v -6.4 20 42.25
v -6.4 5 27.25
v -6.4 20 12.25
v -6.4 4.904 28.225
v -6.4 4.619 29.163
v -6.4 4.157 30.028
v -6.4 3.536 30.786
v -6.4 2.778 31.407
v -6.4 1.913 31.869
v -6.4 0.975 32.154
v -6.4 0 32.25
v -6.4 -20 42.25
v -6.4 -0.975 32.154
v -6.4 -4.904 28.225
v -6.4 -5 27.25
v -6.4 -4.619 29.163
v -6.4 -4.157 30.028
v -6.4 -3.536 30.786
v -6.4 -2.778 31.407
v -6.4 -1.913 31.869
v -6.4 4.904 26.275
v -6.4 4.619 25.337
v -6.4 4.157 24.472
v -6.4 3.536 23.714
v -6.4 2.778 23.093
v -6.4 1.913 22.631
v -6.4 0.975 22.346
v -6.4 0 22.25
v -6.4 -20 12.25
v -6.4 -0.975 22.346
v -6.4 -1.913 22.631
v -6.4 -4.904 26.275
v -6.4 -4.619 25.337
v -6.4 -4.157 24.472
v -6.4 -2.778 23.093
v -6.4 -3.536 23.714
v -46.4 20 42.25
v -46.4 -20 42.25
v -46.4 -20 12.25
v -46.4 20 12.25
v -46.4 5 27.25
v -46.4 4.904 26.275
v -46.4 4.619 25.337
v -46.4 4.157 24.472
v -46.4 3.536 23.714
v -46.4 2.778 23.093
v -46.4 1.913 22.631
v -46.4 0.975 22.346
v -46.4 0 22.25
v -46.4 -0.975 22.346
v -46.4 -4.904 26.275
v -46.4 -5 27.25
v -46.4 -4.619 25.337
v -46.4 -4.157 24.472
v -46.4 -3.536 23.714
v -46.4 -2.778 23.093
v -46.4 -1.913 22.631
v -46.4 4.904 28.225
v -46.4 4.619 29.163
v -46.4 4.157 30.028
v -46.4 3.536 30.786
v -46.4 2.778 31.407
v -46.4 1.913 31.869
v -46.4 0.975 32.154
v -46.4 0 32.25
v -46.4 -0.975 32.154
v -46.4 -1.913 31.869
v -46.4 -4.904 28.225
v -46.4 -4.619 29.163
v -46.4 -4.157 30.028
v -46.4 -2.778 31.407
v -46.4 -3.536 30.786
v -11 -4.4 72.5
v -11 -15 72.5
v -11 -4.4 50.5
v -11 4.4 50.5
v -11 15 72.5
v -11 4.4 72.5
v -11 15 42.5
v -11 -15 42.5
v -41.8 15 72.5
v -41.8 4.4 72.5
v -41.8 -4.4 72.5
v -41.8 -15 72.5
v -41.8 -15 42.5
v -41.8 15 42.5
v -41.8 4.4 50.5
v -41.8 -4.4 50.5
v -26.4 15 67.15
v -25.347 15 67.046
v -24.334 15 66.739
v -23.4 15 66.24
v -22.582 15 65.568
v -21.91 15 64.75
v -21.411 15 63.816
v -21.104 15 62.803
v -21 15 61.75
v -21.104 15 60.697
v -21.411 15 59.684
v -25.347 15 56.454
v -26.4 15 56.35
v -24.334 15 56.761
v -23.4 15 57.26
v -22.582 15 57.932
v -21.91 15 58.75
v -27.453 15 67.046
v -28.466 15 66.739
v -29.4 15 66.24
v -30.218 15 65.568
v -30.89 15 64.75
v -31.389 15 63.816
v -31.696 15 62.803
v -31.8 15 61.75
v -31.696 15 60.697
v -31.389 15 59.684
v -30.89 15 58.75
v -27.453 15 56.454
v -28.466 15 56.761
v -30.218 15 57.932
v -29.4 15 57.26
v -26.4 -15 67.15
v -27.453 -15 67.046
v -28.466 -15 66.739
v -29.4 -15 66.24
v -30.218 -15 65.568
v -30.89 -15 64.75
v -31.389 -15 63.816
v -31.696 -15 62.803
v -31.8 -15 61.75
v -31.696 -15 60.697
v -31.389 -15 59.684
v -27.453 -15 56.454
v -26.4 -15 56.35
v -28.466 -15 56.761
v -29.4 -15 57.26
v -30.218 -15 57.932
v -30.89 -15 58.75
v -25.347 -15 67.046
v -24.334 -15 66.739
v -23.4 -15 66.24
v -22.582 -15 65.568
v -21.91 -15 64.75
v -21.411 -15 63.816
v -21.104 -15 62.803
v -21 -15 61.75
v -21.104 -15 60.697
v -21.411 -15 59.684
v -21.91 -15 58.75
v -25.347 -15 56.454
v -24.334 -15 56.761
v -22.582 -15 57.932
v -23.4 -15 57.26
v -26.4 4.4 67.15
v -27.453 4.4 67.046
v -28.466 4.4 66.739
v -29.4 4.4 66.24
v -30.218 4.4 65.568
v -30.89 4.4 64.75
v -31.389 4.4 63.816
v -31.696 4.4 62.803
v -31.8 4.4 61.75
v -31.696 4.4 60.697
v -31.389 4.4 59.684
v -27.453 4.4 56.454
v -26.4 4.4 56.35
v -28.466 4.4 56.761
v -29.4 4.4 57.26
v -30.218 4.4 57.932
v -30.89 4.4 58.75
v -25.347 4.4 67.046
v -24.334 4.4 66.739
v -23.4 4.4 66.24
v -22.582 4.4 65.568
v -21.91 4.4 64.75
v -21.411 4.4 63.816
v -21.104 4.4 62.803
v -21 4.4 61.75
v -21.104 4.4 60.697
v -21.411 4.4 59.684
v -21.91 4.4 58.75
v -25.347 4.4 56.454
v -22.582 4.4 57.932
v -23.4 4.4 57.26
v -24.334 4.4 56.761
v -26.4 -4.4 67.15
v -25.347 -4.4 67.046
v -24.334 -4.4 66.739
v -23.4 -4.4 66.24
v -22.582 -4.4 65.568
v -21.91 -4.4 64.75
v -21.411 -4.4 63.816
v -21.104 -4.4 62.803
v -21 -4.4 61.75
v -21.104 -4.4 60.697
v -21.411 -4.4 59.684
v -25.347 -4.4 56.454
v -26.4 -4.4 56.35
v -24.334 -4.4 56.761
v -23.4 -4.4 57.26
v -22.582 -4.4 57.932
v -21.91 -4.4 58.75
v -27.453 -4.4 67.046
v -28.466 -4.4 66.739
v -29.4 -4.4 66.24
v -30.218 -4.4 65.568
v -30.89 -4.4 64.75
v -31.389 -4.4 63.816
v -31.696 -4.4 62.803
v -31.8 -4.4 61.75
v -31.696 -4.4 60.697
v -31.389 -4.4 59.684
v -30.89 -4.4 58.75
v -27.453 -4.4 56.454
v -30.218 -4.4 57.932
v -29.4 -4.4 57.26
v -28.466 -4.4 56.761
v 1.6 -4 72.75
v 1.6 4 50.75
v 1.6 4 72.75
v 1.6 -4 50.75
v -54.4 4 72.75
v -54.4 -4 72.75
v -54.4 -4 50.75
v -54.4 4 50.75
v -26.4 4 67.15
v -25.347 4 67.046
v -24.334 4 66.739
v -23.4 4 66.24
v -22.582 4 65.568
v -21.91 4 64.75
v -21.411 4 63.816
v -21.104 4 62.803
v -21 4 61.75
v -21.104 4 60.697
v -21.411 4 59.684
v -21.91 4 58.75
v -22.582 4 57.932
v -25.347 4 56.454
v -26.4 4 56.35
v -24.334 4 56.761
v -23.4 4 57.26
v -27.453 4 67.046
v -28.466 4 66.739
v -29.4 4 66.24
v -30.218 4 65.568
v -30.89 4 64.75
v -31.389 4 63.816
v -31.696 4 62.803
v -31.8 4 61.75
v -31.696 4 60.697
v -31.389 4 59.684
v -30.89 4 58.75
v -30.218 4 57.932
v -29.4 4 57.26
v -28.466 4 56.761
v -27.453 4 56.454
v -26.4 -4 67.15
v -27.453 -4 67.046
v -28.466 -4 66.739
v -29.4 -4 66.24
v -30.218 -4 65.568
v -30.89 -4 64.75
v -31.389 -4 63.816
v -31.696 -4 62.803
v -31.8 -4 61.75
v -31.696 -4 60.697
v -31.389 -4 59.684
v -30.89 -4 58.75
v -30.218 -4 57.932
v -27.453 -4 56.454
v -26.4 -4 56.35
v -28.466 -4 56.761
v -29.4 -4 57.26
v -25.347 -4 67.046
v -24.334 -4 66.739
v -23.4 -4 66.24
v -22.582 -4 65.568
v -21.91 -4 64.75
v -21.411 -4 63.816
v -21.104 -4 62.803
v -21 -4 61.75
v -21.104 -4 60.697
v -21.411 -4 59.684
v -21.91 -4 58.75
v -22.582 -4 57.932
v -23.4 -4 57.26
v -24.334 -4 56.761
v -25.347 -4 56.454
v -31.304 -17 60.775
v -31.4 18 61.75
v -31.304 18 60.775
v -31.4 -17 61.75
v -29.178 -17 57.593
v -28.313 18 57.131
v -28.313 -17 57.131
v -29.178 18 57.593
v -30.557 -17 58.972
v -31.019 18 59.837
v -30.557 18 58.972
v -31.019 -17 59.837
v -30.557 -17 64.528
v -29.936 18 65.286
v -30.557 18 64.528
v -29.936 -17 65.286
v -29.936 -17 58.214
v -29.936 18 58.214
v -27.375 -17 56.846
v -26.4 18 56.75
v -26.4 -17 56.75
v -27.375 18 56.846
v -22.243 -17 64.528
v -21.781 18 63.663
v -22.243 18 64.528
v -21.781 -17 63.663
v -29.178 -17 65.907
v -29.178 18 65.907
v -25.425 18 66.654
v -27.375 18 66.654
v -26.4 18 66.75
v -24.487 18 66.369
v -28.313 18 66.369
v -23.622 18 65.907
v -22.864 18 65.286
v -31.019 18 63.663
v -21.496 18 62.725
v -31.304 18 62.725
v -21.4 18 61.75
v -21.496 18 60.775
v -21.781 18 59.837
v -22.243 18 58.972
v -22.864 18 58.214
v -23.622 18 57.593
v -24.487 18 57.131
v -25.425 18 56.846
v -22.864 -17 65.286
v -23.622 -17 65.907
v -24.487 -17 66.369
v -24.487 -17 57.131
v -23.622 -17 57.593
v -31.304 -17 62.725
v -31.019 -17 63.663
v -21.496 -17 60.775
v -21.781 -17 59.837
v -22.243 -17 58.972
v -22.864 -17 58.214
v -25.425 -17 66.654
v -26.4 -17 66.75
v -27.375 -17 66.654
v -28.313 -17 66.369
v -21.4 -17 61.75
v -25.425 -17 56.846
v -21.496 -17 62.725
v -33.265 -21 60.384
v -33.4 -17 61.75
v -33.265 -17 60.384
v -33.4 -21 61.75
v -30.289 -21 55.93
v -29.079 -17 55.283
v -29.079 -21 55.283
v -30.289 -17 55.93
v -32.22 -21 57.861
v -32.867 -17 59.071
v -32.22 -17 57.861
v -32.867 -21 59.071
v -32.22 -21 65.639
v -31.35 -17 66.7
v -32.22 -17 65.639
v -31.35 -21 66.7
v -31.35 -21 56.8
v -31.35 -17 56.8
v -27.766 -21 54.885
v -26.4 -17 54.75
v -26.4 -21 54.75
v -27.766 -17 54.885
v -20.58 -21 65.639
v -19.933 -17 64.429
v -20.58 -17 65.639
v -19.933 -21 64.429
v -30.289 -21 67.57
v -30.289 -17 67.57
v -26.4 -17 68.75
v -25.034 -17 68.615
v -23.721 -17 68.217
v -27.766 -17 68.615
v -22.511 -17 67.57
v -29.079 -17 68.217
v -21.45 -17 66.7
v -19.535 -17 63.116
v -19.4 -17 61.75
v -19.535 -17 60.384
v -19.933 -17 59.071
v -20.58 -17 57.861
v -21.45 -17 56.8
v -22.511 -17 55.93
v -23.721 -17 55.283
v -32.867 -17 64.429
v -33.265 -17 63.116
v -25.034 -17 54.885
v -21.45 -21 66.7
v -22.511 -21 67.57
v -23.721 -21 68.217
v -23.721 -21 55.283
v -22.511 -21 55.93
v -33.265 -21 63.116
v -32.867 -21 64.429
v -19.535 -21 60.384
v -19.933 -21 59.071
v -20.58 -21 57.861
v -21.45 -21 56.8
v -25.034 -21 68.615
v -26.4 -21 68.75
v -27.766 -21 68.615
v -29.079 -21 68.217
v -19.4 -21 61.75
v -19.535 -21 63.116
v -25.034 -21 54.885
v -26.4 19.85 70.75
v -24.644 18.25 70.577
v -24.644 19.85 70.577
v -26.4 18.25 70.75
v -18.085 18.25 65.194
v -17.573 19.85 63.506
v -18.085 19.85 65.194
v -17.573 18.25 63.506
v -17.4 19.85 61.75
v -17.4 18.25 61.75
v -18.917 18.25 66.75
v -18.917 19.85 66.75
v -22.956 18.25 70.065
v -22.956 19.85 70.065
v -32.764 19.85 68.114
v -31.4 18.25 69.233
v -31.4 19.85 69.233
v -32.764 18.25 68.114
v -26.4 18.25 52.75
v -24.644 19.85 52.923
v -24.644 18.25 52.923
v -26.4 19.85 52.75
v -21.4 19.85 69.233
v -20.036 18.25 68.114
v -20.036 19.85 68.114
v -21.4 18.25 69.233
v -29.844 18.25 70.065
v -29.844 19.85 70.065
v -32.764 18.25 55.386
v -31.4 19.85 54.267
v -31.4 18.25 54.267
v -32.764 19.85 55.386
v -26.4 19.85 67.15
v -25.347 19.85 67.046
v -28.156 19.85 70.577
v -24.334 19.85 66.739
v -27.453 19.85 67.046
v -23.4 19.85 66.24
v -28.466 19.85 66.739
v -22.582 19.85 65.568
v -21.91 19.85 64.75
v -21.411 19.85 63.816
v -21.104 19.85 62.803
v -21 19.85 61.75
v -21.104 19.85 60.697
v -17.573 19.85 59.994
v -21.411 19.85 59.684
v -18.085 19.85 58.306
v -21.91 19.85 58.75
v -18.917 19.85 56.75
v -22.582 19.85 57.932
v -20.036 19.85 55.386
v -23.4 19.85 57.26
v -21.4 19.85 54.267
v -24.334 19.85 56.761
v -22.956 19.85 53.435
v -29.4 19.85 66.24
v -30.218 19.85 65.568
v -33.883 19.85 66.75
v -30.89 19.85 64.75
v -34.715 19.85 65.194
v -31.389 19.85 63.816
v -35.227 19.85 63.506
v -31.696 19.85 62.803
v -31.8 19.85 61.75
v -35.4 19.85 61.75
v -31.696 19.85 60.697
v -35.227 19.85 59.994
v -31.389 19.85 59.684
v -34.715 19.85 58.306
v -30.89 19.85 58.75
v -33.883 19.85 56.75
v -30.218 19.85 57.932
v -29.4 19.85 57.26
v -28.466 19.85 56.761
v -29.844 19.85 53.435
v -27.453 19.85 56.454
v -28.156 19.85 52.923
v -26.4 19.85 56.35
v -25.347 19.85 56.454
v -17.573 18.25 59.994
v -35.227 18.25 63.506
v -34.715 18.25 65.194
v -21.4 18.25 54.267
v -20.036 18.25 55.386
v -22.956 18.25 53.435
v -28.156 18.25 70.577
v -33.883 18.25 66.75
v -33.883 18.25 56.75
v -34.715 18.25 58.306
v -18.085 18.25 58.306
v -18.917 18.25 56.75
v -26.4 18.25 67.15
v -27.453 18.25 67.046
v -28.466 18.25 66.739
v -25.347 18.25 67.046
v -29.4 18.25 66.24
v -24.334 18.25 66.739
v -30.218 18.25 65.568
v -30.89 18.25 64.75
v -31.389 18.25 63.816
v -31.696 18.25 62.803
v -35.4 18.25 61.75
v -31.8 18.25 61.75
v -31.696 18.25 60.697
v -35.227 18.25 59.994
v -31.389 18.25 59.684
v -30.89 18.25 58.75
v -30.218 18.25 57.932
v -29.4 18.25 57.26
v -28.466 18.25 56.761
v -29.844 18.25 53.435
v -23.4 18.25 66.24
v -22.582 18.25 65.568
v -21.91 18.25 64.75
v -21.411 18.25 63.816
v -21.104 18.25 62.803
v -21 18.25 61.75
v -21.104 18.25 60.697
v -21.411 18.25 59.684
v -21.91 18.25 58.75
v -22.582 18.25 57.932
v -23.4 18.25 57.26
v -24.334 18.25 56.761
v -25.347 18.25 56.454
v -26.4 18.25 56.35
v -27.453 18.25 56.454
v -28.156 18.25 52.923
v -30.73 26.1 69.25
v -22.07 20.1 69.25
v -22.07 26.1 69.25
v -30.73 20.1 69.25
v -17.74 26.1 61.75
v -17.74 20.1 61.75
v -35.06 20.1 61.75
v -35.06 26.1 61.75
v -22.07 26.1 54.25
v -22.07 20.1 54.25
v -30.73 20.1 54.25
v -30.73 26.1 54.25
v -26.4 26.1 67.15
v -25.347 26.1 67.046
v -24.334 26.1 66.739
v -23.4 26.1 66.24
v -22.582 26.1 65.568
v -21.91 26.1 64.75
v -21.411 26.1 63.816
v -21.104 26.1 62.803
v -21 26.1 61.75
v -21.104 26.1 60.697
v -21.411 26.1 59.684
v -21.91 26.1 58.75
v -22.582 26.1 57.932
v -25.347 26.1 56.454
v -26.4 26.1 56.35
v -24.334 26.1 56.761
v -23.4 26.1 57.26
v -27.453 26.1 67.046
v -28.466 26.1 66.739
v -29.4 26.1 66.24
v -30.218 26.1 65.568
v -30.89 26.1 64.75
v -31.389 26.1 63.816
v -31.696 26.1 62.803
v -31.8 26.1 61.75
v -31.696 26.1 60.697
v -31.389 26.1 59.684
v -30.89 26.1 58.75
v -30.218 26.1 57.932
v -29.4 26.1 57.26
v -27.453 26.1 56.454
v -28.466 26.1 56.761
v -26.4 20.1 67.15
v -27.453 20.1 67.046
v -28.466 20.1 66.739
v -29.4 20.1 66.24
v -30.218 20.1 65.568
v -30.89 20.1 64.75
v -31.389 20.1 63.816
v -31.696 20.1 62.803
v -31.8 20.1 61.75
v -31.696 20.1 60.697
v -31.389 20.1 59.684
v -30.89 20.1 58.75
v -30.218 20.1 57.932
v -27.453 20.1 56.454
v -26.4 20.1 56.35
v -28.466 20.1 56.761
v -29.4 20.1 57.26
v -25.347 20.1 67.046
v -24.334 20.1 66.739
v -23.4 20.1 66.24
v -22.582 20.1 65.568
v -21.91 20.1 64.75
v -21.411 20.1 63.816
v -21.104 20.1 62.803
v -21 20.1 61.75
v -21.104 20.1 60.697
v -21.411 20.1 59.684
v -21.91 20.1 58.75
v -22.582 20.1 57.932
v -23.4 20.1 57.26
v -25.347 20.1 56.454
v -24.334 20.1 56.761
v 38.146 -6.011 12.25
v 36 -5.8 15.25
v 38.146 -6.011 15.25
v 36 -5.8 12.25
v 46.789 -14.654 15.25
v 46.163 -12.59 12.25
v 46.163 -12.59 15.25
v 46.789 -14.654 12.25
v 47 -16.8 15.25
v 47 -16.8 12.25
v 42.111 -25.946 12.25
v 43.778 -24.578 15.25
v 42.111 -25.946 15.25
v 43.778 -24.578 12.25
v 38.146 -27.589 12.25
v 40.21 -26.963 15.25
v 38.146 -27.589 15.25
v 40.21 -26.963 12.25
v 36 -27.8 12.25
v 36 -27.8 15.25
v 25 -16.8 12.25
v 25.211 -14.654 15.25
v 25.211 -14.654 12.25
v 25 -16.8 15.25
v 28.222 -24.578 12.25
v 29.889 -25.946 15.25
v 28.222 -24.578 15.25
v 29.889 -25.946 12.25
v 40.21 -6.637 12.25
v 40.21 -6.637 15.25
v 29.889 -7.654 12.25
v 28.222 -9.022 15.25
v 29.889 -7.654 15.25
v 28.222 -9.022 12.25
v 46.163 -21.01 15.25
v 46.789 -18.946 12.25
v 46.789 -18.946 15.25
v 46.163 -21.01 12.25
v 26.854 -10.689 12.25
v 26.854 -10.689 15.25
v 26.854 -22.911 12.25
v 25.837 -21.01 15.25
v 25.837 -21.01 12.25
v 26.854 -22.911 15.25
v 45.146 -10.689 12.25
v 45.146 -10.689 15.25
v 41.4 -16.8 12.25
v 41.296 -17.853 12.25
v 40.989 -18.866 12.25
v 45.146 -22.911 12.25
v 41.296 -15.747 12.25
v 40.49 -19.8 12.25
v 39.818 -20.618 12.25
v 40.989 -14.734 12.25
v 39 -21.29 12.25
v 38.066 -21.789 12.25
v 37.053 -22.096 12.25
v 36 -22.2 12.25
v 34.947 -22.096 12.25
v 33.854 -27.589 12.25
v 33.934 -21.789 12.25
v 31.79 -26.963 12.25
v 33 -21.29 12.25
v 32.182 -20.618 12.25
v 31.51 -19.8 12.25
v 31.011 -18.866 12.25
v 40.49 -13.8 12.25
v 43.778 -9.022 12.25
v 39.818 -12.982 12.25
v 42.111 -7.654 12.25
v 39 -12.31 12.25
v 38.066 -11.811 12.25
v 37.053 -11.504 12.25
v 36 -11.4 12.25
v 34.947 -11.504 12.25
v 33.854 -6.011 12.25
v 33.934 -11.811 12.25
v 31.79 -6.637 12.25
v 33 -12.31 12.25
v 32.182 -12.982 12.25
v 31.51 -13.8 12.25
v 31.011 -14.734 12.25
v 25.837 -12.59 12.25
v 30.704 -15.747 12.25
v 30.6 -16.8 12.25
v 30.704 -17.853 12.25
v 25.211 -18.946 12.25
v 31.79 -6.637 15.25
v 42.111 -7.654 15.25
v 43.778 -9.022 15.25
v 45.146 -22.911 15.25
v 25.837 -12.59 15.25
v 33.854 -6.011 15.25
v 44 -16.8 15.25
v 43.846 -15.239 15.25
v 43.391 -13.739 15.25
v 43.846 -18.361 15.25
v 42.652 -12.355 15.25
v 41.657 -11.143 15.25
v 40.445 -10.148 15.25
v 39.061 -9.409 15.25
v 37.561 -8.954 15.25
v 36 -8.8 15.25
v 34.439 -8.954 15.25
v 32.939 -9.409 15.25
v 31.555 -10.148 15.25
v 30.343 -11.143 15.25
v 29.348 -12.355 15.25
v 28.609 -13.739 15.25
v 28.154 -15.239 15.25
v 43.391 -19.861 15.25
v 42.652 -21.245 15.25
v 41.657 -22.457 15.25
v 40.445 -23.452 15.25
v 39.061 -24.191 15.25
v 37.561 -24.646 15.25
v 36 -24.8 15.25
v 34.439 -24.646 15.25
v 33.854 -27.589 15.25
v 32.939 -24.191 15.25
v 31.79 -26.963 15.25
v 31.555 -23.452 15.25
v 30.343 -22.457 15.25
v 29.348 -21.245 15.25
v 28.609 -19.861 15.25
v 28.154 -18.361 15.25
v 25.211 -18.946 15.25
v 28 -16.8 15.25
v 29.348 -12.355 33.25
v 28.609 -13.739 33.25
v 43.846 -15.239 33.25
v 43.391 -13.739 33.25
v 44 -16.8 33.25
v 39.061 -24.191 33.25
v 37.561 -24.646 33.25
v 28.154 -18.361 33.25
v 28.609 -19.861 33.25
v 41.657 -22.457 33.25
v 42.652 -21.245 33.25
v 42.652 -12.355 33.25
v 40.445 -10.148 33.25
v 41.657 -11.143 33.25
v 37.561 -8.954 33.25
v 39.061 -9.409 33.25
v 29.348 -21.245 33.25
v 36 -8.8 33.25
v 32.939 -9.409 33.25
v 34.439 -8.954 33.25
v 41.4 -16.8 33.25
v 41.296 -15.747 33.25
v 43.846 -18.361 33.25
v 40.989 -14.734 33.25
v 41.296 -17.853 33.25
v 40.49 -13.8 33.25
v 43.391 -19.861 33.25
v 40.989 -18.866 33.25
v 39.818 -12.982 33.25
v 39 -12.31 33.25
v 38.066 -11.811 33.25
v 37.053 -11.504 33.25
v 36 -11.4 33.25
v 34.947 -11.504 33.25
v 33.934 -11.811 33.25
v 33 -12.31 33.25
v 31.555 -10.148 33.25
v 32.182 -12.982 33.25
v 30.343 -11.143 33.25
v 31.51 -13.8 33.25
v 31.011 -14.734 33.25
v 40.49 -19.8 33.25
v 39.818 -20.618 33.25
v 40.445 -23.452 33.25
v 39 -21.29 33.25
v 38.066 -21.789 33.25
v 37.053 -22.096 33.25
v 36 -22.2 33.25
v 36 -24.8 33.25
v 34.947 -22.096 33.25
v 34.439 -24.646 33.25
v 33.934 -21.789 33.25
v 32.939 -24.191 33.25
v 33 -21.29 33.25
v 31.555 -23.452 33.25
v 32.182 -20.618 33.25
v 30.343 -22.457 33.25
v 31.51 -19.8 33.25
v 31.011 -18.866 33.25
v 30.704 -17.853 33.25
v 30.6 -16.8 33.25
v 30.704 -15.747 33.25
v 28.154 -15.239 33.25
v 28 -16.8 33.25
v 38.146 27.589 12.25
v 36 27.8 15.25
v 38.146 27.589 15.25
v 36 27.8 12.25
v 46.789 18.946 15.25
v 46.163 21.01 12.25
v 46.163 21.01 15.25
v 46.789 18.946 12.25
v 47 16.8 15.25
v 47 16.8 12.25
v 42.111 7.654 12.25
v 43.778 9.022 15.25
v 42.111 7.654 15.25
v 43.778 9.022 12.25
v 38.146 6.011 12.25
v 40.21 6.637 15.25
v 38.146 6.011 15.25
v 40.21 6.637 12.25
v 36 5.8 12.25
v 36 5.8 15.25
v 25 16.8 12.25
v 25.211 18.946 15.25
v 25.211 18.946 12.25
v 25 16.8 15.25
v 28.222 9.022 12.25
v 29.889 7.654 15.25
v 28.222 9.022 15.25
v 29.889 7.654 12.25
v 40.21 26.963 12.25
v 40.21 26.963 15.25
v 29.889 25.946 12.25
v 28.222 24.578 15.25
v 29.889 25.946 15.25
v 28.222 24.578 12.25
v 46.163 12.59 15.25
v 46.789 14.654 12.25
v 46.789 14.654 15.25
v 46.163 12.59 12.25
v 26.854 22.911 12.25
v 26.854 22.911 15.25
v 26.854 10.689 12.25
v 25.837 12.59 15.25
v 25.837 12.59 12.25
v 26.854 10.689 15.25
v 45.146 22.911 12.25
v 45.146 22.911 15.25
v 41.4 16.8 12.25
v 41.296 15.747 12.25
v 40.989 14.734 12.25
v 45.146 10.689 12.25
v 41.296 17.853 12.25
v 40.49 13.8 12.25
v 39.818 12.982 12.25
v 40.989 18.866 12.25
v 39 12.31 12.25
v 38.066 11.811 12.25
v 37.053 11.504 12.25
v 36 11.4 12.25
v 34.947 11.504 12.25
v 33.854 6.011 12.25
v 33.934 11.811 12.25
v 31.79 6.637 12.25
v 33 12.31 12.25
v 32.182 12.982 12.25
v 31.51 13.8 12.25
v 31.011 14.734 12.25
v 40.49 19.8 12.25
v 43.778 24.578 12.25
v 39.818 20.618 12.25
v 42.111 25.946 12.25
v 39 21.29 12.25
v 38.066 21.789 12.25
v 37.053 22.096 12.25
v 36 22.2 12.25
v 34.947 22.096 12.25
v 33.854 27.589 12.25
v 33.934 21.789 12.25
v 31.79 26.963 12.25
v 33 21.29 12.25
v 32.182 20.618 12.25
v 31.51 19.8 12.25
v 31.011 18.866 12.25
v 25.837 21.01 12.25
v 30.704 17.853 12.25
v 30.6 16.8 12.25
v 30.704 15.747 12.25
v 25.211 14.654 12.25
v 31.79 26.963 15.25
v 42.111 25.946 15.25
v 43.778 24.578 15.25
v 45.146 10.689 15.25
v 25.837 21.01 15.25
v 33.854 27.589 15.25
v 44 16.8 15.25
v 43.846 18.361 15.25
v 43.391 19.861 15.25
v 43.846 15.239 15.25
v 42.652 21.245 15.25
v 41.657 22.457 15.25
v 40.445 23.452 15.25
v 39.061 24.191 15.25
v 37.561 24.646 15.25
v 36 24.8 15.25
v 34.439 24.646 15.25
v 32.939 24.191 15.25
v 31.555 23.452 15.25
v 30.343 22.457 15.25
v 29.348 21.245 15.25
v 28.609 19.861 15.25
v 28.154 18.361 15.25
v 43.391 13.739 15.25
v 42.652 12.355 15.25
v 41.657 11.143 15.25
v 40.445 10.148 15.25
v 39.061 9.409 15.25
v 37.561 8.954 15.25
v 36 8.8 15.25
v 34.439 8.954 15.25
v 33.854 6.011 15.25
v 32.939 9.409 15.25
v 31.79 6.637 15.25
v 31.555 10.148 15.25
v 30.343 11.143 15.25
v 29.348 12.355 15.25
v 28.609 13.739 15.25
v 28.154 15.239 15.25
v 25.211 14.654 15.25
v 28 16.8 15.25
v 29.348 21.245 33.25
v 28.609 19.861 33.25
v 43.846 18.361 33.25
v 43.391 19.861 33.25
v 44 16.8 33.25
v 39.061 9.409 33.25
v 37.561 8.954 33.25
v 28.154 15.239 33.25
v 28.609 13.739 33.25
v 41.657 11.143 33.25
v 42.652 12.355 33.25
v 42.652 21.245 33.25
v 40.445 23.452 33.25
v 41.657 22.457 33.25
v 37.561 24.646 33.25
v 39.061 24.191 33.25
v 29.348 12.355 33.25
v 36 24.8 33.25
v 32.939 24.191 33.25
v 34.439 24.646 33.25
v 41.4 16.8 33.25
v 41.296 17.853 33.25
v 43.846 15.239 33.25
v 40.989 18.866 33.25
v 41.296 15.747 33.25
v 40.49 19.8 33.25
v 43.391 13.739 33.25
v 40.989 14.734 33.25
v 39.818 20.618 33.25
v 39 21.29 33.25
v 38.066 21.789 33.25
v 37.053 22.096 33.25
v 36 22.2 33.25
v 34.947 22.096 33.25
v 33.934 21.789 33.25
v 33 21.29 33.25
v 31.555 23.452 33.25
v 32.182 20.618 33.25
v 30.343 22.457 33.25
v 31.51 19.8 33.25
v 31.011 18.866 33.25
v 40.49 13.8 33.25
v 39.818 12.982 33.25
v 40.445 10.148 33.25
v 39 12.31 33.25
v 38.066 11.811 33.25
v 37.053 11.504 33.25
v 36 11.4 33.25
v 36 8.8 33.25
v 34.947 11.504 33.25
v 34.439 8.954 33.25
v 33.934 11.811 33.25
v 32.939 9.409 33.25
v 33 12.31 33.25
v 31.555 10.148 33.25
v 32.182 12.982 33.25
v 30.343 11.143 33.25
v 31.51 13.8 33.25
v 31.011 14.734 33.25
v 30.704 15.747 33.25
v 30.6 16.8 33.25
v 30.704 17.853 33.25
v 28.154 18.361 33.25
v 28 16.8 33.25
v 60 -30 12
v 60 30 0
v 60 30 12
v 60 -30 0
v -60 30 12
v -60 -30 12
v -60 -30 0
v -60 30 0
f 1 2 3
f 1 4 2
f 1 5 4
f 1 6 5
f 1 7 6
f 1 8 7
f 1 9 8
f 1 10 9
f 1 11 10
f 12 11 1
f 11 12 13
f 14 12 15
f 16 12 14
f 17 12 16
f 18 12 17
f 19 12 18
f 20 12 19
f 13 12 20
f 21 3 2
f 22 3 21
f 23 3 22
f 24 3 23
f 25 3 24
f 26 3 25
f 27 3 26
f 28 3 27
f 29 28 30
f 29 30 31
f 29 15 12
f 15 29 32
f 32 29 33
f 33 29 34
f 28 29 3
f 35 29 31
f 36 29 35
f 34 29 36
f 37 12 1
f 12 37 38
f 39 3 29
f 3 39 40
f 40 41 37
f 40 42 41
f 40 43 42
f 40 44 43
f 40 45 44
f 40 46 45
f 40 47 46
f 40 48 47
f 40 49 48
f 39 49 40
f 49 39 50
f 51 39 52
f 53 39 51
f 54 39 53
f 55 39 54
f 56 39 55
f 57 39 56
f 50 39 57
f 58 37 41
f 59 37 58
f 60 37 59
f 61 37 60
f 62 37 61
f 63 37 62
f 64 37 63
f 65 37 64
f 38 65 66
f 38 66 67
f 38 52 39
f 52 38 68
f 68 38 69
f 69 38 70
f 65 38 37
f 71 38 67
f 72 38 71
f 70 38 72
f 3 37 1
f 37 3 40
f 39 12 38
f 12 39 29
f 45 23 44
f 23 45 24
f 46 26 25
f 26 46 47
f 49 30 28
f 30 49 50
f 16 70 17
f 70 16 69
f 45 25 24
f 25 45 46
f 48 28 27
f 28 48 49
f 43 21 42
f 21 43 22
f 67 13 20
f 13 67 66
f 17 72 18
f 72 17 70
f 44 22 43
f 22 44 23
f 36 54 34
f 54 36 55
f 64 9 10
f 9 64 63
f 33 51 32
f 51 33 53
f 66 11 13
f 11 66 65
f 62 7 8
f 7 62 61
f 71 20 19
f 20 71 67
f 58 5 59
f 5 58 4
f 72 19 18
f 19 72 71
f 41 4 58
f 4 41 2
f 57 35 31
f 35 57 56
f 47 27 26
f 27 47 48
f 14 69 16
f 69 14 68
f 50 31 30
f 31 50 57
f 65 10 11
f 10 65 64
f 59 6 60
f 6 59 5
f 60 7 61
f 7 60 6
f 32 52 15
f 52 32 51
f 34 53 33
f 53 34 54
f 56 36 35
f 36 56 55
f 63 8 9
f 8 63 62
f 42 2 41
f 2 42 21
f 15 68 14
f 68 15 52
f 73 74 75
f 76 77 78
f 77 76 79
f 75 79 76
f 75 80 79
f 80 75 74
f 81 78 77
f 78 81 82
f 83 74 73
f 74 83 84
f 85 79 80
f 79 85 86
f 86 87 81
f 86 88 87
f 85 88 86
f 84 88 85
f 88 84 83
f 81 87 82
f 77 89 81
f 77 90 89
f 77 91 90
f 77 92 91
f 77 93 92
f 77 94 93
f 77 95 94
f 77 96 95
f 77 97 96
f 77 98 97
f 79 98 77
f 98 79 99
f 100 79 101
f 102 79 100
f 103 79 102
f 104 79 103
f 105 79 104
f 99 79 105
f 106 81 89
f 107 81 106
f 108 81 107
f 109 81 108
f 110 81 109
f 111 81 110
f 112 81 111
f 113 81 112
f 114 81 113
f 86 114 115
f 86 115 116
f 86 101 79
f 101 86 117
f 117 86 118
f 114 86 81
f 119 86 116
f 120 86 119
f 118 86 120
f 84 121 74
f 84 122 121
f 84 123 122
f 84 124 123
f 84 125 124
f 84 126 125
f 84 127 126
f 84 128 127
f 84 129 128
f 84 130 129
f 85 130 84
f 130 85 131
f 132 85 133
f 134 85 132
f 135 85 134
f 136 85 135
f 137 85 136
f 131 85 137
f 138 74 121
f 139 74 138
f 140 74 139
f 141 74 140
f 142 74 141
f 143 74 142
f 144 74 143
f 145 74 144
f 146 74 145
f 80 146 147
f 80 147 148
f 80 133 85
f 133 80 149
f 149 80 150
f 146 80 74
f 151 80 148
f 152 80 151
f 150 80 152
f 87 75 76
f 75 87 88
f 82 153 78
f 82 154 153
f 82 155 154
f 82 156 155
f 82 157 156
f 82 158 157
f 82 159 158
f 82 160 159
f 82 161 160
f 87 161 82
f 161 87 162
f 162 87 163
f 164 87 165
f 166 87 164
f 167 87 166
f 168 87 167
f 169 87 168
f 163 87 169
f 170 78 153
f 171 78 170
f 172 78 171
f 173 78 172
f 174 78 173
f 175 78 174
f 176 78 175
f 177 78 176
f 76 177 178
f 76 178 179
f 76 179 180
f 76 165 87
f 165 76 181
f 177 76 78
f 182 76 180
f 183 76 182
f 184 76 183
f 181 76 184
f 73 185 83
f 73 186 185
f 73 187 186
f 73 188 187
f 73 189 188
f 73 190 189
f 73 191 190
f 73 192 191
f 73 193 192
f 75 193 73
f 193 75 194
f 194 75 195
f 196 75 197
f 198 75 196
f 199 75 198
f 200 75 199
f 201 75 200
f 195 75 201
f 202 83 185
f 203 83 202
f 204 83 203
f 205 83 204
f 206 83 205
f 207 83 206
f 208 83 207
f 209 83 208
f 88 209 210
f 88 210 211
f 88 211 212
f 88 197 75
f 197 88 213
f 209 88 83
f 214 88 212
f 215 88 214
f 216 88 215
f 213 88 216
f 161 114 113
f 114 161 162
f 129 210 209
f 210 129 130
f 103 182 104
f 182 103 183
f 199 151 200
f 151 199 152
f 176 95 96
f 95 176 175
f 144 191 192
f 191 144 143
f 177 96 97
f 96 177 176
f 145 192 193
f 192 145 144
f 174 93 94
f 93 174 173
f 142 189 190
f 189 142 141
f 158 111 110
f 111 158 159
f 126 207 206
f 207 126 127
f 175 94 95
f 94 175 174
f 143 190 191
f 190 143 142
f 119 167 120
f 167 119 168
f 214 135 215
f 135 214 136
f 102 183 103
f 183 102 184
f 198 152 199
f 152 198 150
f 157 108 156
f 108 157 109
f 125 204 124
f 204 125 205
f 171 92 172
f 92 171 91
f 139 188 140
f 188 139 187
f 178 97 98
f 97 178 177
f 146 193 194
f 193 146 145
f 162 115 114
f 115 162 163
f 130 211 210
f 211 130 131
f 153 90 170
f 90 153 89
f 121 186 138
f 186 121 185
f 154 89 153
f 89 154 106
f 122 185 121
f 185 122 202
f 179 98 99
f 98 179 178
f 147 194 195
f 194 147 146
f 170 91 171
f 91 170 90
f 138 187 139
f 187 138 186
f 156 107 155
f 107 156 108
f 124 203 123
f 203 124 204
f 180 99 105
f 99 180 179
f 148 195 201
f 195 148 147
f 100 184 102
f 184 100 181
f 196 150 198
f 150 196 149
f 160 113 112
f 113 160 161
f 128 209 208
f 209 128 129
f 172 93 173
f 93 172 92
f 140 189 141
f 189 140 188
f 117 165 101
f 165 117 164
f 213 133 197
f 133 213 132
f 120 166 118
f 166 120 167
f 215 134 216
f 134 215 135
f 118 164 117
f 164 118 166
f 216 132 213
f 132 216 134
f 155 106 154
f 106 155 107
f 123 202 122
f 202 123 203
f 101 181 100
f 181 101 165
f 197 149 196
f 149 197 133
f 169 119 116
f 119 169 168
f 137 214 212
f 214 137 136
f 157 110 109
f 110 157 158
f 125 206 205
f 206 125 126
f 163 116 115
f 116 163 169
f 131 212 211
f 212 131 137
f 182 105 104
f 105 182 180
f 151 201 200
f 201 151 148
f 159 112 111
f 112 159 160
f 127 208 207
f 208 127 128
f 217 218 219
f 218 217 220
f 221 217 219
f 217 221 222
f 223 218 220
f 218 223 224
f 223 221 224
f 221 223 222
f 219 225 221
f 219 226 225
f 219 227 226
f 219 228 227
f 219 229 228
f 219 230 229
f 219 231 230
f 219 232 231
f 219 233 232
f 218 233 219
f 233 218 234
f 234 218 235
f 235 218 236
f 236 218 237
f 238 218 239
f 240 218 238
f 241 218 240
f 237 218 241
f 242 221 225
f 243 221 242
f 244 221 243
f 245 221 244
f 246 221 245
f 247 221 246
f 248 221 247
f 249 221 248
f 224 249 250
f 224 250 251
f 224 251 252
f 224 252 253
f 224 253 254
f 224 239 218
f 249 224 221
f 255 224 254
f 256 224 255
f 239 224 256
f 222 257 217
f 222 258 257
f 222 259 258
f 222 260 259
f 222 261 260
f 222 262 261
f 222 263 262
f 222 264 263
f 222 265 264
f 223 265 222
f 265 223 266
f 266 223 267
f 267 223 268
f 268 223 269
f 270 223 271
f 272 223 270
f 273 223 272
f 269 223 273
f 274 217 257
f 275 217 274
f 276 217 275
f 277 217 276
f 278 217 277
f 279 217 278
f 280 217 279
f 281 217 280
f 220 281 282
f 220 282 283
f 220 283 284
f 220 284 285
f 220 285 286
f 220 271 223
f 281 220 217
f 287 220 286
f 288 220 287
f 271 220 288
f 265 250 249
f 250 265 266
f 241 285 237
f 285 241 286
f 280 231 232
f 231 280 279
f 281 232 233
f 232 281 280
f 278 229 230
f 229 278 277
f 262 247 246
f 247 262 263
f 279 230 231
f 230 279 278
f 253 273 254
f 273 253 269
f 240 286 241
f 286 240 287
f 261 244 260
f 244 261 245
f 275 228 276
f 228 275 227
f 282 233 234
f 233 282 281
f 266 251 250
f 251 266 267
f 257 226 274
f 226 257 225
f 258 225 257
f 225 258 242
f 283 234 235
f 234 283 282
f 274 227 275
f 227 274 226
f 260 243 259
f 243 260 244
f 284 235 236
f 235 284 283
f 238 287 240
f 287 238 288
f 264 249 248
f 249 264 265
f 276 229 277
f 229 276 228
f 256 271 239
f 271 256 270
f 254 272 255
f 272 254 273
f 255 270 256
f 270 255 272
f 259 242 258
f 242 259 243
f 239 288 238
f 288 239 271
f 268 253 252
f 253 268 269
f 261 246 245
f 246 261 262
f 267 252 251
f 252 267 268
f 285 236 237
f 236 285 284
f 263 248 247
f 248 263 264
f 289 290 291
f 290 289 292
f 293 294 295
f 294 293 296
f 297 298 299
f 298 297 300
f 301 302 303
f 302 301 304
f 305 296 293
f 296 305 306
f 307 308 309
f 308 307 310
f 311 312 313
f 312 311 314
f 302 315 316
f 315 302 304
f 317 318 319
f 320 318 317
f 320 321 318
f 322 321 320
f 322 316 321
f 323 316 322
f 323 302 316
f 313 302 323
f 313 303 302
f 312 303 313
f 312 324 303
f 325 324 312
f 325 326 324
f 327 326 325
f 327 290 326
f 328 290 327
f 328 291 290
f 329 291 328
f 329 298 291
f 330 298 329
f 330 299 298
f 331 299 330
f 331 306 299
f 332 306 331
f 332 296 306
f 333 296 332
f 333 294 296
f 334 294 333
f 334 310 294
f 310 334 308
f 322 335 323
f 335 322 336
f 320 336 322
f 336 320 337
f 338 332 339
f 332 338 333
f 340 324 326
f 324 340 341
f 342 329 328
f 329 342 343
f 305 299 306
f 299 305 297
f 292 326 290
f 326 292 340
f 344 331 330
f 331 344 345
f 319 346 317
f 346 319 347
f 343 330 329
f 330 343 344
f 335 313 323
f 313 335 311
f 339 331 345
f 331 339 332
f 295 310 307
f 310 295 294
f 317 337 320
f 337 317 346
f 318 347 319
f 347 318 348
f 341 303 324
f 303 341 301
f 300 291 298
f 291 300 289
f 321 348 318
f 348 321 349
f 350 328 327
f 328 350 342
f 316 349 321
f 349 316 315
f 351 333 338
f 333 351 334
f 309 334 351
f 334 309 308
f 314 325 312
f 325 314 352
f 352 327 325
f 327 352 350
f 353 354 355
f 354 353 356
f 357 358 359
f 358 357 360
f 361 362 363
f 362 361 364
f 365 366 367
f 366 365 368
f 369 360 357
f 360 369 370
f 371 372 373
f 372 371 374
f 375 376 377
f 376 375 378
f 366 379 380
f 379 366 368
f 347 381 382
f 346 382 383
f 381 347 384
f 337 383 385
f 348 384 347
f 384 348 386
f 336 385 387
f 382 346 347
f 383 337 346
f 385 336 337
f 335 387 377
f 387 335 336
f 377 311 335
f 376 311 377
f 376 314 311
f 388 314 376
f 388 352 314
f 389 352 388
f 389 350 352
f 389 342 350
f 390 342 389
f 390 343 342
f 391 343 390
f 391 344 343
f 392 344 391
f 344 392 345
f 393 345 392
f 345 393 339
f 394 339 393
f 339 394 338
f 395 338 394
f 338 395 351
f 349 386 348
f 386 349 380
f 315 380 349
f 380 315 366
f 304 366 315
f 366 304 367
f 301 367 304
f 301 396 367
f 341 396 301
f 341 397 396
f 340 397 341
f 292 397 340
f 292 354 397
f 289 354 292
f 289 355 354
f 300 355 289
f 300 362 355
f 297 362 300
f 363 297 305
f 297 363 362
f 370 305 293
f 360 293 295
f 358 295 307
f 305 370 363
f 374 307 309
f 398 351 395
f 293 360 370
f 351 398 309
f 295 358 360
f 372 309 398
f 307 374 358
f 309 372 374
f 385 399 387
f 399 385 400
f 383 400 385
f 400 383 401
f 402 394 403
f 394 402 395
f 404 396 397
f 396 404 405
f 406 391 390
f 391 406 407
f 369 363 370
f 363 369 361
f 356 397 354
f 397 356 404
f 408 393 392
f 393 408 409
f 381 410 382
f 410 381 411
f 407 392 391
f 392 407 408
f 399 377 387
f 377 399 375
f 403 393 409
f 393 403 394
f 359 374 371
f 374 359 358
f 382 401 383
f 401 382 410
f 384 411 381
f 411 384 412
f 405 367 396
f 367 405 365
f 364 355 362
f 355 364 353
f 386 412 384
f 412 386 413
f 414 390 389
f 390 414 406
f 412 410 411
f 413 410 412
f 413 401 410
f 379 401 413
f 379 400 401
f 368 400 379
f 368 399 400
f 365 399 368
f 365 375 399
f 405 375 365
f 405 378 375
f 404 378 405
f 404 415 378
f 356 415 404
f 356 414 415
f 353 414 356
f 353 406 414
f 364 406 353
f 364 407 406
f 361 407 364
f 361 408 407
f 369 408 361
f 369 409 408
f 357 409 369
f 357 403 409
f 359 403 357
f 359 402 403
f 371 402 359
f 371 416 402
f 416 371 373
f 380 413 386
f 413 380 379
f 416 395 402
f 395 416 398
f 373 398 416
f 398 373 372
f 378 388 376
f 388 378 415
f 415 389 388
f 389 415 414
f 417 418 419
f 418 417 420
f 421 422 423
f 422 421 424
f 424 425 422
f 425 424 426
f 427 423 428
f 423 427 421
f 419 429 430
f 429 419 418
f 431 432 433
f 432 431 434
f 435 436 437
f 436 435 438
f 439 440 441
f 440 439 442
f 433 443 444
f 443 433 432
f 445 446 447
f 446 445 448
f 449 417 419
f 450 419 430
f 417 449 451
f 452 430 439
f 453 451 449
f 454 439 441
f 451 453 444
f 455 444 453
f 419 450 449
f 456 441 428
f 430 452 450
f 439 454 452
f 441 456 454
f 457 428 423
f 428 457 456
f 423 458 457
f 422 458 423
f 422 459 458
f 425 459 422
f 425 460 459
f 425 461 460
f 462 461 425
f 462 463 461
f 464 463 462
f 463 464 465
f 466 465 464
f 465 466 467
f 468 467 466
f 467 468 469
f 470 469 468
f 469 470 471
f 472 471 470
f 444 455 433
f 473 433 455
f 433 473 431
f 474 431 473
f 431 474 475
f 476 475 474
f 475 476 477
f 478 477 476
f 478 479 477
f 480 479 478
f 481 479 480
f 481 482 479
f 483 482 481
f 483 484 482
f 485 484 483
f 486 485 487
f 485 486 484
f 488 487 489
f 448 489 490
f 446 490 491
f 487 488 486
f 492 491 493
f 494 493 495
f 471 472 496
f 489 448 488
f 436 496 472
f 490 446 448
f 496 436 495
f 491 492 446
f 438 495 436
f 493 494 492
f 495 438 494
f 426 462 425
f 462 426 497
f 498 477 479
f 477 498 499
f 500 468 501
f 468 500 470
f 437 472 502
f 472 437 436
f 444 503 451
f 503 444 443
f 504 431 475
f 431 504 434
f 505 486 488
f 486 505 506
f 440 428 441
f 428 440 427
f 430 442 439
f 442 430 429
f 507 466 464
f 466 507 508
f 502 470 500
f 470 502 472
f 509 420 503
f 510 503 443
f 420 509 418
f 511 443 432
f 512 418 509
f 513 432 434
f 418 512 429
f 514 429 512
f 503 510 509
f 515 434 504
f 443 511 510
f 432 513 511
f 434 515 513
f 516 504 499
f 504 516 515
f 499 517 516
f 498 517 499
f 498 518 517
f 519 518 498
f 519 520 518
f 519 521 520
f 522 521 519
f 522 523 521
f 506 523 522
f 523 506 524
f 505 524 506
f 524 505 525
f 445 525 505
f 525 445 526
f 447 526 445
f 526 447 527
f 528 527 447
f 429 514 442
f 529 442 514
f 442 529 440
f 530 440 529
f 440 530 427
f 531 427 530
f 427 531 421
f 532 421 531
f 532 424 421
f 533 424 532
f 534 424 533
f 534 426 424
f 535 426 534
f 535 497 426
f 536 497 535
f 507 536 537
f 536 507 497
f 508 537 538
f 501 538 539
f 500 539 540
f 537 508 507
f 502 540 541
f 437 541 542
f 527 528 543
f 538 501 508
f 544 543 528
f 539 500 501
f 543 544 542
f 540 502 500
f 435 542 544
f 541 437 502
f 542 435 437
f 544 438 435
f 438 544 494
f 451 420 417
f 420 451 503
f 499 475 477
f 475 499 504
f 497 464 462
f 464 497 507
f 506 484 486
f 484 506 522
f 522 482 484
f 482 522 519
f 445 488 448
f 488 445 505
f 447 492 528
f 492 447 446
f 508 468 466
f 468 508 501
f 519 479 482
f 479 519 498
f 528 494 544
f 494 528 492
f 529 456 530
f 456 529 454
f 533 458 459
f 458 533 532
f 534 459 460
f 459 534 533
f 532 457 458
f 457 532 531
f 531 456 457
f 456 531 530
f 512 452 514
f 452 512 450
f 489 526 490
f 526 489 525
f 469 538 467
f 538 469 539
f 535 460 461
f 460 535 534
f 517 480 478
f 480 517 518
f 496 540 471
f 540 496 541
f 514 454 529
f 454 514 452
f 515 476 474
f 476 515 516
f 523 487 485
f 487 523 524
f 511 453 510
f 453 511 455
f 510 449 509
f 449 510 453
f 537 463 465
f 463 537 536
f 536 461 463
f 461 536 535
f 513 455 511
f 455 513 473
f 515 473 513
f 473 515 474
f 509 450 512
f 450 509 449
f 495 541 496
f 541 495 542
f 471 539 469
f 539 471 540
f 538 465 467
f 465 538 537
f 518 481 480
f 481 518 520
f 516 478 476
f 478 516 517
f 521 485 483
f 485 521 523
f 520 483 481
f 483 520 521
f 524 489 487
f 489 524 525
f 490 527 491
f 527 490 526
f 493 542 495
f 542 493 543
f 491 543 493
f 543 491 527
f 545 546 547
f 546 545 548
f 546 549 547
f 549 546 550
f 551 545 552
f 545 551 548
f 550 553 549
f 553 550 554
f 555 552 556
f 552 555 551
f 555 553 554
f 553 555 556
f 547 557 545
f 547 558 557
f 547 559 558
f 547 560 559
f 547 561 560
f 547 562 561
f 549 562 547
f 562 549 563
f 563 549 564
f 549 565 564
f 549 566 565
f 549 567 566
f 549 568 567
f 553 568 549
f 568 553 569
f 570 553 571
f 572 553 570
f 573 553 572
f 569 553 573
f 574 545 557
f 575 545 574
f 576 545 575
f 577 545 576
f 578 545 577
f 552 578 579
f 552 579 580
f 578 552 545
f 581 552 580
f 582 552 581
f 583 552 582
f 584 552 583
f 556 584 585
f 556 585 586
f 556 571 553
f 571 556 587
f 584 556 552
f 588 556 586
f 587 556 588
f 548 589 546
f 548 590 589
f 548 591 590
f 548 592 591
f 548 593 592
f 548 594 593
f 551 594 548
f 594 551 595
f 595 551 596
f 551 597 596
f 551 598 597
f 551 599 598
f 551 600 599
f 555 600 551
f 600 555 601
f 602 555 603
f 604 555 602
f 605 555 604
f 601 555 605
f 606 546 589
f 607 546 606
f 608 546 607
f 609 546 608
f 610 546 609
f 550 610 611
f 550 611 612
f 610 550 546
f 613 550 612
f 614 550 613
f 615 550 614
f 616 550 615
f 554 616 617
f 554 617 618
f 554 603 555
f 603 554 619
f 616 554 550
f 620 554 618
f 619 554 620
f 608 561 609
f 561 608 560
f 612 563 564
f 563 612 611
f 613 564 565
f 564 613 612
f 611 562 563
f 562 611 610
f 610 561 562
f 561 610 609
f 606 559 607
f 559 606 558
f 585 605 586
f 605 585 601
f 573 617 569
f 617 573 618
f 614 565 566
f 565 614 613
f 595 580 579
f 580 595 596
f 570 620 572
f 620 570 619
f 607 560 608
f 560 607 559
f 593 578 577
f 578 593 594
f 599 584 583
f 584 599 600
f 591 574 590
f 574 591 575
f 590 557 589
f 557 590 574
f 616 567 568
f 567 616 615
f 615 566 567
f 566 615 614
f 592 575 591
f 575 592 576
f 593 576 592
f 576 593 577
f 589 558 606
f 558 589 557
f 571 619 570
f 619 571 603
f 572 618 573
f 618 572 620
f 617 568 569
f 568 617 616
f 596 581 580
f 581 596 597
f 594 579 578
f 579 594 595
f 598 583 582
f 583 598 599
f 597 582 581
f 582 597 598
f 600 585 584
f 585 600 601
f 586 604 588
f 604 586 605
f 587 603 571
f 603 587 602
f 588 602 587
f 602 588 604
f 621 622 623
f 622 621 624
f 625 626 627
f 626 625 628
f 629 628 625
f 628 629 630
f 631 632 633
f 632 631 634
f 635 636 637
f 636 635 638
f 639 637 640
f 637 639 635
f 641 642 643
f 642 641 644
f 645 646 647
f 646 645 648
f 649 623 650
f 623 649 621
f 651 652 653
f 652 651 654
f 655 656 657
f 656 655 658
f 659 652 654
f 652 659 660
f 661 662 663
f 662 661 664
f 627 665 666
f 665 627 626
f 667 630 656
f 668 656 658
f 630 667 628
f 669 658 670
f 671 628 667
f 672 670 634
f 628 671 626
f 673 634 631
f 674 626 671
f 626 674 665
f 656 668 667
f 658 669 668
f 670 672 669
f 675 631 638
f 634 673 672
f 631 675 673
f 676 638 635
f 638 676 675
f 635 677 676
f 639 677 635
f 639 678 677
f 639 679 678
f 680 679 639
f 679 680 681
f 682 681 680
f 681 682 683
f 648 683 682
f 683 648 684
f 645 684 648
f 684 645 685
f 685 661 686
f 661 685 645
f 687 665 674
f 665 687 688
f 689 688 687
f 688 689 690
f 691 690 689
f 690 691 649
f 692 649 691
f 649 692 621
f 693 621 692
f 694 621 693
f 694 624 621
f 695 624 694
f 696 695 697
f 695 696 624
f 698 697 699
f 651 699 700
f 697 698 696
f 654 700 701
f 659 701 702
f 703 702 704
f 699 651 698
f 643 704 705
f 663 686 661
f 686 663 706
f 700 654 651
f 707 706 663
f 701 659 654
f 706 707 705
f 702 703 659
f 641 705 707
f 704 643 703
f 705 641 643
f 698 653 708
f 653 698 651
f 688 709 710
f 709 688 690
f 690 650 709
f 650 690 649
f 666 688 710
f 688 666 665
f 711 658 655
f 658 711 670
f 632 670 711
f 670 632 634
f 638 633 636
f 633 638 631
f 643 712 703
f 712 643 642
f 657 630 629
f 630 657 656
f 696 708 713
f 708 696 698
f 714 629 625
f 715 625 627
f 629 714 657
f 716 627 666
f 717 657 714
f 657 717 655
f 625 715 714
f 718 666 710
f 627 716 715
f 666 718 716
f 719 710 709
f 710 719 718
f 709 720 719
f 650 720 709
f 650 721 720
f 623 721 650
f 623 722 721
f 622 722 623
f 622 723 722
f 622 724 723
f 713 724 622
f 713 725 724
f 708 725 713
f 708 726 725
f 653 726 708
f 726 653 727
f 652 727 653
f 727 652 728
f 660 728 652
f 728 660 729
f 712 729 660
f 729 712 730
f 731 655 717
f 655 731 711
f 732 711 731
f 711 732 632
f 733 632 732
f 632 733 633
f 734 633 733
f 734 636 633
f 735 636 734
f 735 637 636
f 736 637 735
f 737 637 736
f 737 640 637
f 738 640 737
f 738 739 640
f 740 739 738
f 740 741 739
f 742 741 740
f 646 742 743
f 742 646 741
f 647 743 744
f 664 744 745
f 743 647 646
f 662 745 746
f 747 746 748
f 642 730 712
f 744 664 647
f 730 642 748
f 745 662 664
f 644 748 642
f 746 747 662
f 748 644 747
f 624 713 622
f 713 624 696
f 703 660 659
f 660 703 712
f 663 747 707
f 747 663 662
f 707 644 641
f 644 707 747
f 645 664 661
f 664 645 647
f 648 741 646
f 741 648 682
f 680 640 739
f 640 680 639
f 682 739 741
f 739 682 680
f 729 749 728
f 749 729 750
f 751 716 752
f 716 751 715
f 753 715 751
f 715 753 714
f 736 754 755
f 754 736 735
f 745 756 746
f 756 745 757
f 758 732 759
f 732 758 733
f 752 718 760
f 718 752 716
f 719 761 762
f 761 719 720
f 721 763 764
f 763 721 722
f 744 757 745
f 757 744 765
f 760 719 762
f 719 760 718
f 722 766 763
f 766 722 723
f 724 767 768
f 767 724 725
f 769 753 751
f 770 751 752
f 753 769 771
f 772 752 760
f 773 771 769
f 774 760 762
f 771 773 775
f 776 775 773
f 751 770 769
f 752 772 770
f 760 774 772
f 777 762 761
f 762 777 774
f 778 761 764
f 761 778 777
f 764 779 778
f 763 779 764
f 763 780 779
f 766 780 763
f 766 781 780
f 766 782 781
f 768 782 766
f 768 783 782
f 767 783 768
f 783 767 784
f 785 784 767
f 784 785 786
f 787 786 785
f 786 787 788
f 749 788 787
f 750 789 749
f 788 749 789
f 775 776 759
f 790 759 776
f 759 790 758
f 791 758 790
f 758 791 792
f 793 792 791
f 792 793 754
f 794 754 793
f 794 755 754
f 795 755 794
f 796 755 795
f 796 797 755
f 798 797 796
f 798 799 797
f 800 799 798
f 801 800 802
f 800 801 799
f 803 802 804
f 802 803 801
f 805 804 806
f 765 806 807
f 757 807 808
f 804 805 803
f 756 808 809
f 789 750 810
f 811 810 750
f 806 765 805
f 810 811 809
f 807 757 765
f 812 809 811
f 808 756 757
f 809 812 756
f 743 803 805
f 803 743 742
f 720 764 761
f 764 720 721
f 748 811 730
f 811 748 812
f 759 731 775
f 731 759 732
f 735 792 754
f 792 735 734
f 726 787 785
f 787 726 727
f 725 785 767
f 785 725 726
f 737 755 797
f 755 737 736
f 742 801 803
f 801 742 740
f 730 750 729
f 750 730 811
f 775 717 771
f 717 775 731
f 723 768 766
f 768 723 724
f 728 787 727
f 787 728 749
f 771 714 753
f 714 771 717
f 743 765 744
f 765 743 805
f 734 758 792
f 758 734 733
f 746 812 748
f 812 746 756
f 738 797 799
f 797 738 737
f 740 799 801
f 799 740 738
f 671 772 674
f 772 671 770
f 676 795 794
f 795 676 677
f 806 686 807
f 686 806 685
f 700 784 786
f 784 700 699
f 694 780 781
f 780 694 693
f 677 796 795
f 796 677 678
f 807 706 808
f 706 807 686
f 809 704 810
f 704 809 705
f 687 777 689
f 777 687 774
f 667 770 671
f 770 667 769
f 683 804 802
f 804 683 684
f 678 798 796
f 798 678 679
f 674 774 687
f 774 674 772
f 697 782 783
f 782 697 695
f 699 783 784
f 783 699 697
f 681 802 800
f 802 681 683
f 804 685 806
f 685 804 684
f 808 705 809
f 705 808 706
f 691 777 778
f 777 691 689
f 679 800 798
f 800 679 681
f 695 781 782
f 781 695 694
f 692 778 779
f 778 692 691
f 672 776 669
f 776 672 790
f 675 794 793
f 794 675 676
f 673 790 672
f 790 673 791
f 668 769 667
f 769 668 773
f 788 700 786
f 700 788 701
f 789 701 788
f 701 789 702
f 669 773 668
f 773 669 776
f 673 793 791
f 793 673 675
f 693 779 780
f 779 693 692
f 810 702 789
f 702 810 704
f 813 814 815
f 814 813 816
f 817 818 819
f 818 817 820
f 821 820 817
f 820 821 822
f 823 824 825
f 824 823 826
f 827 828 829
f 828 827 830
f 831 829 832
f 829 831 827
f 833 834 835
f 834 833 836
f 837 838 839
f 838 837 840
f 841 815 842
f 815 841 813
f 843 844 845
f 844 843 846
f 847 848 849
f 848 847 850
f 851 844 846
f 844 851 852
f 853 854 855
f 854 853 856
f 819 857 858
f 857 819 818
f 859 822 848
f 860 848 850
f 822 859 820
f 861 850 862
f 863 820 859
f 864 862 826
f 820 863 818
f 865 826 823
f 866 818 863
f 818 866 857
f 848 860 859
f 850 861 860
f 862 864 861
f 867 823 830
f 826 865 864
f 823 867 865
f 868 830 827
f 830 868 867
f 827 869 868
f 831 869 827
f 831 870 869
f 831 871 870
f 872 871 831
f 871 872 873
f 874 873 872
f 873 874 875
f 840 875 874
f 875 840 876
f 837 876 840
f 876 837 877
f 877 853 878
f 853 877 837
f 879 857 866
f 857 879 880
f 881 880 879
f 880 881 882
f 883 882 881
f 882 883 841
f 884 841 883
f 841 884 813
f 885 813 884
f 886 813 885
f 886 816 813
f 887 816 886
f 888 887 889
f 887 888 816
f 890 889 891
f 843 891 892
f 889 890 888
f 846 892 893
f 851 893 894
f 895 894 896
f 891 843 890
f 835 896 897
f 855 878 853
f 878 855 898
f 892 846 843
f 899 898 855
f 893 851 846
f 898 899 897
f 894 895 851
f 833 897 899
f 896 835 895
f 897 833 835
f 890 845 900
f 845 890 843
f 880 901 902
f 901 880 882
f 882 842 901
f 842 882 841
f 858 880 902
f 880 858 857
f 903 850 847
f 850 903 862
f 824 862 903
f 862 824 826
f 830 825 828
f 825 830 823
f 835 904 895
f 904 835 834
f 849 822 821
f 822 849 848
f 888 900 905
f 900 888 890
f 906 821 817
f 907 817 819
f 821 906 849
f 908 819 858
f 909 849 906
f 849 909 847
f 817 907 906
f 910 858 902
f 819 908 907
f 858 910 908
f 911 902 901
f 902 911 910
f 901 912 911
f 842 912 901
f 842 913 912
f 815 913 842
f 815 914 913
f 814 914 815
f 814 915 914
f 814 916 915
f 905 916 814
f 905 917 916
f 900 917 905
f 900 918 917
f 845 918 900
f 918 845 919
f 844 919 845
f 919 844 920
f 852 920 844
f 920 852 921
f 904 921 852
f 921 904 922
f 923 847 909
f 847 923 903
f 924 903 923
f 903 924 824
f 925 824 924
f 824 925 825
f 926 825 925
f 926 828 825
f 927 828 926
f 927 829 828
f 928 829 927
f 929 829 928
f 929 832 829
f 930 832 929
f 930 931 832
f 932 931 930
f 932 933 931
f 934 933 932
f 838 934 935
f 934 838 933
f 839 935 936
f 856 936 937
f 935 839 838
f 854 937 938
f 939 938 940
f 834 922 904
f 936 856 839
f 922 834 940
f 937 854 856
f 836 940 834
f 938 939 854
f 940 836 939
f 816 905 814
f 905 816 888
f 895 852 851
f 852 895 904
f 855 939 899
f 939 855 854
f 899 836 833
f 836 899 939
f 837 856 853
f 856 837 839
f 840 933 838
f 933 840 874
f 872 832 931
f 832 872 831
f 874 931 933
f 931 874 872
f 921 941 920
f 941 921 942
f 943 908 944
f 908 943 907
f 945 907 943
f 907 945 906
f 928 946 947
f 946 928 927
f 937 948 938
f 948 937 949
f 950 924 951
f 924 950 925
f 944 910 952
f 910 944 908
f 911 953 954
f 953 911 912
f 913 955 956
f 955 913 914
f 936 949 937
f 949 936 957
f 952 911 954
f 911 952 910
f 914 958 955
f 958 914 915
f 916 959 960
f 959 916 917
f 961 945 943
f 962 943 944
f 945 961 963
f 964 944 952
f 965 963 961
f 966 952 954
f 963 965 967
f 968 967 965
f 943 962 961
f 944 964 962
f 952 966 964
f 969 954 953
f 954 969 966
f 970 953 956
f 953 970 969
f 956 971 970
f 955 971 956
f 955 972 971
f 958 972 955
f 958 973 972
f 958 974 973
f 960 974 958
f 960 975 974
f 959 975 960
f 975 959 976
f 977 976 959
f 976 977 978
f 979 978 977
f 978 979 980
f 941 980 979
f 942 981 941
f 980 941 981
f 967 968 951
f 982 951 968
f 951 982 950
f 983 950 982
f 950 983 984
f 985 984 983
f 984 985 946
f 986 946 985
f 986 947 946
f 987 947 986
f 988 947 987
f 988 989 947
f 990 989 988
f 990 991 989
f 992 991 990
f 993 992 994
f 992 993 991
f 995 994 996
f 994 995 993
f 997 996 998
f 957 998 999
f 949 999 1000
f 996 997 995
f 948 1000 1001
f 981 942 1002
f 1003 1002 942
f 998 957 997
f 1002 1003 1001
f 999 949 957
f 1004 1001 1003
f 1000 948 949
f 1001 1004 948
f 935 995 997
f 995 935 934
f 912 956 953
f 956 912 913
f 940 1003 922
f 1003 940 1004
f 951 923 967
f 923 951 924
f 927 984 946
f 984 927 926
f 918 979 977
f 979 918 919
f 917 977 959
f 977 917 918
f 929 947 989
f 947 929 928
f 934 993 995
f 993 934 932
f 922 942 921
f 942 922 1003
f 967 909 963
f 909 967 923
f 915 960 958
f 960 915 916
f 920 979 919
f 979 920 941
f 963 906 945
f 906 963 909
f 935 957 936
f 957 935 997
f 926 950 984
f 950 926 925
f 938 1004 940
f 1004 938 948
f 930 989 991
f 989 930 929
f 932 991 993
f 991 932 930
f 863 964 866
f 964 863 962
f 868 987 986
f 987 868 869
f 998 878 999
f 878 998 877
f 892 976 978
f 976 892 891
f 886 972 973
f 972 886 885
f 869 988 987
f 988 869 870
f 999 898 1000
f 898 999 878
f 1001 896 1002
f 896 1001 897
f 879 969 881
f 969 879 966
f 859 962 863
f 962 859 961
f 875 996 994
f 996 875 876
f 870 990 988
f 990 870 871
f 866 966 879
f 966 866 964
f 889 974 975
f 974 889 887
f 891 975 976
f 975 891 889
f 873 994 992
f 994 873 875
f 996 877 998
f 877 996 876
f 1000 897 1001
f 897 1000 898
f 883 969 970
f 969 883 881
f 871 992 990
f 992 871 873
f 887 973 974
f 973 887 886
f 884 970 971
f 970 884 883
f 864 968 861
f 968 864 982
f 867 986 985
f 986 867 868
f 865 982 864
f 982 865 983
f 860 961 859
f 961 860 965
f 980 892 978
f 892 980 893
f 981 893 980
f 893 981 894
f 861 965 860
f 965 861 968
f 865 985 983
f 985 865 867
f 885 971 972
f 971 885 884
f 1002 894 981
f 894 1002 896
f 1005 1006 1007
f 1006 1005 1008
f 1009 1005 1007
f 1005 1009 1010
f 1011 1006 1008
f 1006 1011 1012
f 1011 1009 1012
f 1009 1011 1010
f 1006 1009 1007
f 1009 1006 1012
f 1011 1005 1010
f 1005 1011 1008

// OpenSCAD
$fn = 32;

// ------------------------------------------------------------------------
// Indexing jig: plate 120 x 60 mm, pin d10
// Every part is its own module, assembly() places every instance.
// ------------------------------------------------------------------------

// --- part 1 ---
module jig_plate() {
  difference() {
    translate([-60, -30, 0]) cube([120, 60, 12]);
  }
}

// --- part 2 ---
module locator_block() {
  difference() {
    translate([-20, -20, 0]) cube([40, 40, 30]);
    translate([0, 0, 15]) rotate([0, 90, 0]) cylinder(h = 42, d = 10, center = true);
  }
}

// --- part 3 ---
module index_fork() {
  difference() {
    translate([-15.4, -15, 0]) cube([30.8, 30, 30]);
    translate([-16.4, -4.4, 8]) cube([32.8, 8.8, 23]);
    translate([0, 0, 19.25]) rotate([90, 0, 0]) cylinder(h = 32, d = 10.8, center = true);
  }
}

// --- part 4 ---
module index_arm() {
  difference() {
    translate([-28, -4, 0]) cube([56, 8, 22]);
    translate([0, 0, 11]) rotate([90, 0, 0]) cylinder(h = 10, d = 10.8, center = true);
  }
}

// --- part 5 ---
module index_pin() {
  rotate([0, 90, 0]) cylinder(h = 36, d = 10, center = true);
  translate([-21, 0, 0]) rotate([0, 90, 0]) cylinder(h = 4, d = 14);
}

// --- part 6 ---
module pin_washer() {
  difference() {
      translate([0, 0, 0]) cylinder(h = 1.6, d = 18);
      translate([0, 0, -1]) cylinder(h = 3.6, d = 10.8);
    }
}

// --- part 7 ---
module lock_nut() {
  difference() {
    linear_extrude(height = 6) polygon(points = [[8.66, 0], [4.33, 7.5], [-4.33, 7.5], [-8.66, 0], [-4.33, -7.5], [4.33, -7.5]]);
    translate([0, 0, -1]) cylinder(h = 8, d = 10.8);
  }
}

// --- part 8 ---
module guide_bush_a() {
  difference() {
    union() {
      cylinder(h = 3, d = 22);
      translate([0, 0, 3]) cylinder(h = 18, d = 16);
    }
    translate([0, 0, -1]) cylinder(h = 23, d = 10.8);
  }
}

// --- part 9 ---
module guide_bush_b() {
  difference() {
    union() {
      cylinder(h = 3, d = 22);
      translate([0, 0, 3]) cylinder(h = 18, d = 16);
    }
    translate([0, 0, -1]) cylinder(h = 23, d = 10.8);
  }
}

// --- assembly ---
module assembly() {
  color([0.80, 0.24, 0.20]) translate([0, 0, 0]) rotate([0, 0, 0]) jig_plate();
  color([0.20, 0.45, 0.75]) translate([-26.4, 0, 12.25]) rotate([0, 0, 0]) locator_block();
  color([0.25, 0.62, 0.32]) translate([-26.4, 0, 42.5]) rotate([0, 0, 0]) index_fork();
  color([0.92, 0.70, 0.18]) translate([-26.4, 0, 50.75]) rotate([0, 0, 0]) index_arm();
  color([0.58, 0.35, 0.70]) translate([-26.4, 0, 61.75]) rotate([0, 0, 90]) index_pin();
  color([0.16, 0.66, 0.66]) translate([-26.4, 19.85, 61.75]) rotate([90, 0, 0]) pin_washer();
  color([0.85, 0.48, 0.18]) translate([-26.4, 26.1, 61.75]) rotate([90, 0, 0]) lock_nut();
  color([0.55, 0.60, 0.65]) translate([36, -16.8, 12.25]) rotate([0, 0, 0]) guide_bush_a();
  color([0.75, 0.30, 0.55]) translate([36, 16.8, 12.25]) rotate([0, 0, 0]) guide_bush_b();
}

assembly();
